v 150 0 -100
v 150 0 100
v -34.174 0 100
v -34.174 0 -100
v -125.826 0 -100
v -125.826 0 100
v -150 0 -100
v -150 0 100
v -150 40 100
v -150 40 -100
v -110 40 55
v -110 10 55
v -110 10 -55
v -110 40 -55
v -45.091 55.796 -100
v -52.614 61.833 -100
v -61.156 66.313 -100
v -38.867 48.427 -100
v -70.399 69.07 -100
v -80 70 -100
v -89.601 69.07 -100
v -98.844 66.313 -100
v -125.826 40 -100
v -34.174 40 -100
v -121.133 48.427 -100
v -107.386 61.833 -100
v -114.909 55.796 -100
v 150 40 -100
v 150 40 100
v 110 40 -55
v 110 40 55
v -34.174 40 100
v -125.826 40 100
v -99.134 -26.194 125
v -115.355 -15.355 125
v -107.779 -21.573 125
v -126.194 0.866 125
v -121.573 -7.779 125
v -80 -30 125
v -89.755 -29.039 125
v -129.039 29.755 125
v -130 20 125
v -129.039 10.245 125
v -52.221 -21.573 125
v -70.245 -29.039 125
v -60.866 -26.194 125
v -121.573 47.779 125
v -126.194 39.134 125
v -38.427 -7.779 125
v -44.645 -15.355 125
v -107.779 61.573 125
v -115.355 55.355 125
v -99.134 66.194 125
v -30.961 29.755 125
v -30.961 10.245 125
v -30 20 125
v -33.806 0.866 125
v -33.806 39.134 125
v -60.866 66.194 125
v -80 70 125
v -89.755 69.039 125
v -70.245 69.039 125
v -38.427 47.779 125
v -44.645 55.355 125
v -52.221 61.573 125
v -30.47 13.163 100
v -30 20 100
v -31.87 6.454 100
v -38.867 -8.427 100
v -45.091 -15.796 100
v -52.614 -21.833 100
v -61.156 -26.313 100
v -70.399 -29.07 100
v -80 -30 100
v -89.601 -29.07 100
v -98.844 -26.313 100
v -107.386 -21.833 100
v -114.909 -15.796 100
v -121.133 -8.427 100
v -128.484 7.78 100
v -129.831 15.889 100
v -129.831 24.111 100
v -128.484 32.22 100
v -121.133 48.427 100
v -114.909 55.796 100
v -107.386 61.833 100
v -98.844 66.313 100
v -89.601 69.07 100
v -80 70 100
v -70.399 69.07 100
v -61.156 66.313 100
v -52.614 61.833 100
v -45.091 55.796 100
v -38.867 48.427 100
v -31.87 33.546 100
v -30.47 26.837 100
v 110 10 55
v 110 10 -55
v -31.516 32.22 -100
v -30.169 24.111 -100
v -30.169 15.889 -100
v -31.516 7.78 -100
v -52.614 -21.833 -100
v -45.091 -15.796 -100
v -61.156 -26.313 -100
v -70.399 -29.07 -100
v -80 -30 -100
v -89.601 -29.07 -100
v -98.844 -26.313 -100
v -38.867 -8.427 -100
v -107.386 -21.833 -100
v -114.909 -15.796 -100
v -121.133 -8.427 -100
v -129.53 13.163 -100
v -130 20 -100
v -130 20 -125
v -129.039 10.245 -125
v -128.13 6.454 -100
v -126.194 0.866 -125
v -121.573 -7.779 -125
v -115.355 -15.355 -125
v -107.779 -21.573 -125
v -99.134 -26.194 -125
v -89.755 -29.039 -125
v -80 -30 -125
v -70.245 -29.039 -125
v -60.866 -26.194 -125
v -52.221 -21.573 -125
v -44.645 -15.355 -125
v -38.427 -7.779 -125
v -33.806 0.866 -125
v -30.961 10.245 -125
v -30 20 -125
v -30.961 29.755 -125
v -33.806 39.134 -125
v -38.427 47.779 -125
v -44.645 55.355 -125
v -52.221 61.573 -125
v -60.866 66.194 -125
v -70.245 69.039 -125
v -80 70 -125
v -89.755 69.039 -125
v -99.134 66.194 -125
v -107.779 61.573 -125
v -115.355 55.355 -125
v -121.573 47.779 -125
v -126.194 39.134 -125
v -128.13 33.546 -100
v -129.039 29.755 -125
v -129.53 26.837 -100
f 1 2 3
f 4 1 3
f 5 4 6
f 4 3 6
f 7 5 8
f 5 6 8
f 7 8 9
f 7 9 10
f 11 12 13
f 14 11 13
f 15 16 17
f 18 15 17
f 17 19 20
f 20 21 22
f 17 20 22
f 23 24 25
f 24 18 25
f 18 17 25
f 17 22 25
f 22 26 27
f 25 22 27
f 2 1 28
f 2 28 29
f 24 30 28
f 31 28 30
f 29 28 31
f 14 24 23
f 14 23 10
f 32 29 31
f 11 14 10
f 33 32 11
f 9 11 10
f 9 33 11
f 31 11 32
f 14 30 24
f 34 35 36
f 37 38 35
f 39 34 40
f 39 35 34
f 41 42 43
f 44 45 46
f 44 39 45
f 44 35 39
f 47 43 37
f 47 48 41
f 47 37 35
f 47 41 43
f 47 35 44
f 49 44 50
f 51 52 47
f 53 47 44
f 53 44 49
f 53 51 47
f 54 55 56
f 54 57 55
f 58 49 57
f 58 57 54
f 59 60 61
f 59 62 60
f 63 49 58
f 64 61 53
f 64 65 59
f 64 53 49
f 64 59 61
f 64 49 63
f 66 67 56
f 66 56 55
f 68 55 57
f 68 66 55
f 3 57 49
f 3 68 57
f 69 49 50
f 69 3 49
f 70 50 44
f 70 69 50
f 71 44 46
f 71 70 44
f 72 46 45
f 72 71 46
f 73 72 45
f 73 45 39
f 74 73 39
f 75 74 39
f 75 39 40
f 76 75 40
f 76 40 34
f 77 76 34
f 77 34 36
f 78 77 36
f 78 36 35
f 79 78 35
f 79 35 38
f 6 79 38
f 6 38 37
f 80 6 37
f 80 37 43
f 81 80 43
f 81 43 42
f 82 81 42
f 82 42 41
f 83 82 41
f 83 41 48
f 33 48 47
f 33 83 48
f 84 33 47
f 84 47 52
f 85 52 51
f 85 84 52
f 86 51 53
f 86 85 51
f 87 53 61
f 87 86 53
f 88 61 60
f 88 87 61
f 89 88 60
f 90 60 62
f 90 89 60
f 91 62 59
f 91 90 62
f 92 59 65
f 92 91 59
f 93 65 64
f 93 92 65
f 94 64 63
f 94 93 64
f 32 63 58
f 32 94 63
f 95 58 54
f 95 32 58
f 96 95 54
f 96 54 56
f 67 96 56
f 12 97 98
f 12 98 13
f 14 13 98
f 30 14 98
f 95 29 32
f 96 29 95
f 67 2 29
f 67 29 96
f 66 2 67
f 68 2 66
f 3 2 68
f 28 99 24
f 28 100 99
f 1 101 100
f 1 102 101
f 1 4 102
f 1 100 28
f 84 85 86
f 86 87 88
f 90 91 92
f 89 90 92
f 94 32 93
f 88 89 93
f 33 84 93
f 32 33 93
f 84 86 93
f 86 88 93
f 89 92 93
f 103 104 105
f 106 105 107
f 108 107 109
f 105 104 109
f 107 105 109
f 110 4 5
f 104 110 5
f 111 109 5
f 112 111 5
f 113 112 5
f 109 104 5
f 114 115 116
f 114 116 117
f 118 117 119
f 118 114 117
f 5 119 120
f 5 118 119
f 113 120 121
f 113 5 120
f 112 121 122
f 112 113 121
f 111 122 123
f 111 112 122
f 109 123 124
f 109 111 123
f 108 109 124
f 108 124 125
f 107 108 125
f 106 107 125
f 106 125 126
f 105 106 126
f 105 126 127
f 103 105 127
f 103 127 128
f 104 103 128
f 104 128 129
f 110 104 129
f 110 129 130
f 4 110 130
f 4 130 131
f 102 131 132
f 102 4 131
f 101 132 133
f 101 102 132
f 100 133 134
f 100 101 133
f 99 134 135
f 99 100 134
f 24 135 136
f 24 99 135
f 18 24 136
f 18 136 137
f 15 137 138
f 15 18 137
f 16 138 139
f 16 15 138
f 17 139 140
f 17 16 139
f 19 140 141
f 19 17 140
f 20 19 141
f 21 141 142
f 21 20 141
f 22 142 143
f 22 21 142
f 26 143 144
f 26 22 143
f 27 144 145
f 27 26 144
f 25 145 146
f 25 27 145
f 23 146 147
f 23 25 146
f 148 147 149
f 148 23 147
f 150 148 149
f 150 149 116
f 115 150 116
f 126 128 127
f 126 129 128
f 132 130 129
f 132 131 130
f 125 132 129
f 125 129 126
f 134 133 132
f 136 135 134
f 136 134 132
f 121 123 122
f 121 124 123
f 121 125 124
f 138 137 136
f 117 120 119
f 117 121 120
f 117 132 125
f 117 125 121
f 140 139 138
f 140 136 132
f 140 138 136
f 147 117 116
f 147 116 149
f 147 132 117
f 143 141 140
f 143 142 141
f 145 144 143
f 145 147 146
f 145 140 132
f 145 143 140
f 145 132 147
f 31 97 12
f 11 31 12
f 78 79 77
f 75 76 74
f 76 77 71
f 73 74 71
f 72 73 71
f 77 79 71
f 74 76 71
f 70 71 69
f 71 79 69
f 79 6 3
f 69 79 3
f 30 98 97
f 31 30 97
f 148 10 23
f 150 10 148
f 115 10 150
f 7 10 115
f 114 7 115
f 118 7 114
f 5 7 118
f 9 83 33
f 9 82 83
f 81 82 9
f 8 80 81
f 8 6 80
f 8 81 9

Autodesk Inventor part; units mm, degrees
ref_plane "YZ Plane" through (0, 0, 0) normal (1, 0, 0) x (0, 1, 0)
ref_plane "XZ Plane" through (0, 0, 0) normal (0, 1, 0) x (-1, 0, 0)
ref_plane "XY Plane" through (0, 0, 0) normal (0, 0, 1) x (1, 0, 0)
sketch "Sketch1" plane through (0, 0, 0) normal (0, 1, 0) x (-1, 0, 0)
  line L0 (-110, 55) -> (110, 55)
  line L1 (110, 55) -> (110, -55)
  line L2 (110, -55) -> (-110, -55)
  line L3 (-110, -55) -> (-110, 55)
  line L4 (-110, 55) -> (110, -55) construction
  line L5 (110, 55) -> (-110, -55) construction
  line L6 (-150, 100) -> (150, 100)
  line L7 (150, 100) -> (150, -100)
  line L8 (150, -100) -> (-150, -100)
  line L9 (-150, -100) -> (-150, 100)
  line L10 (-150, 100) -> (150, -100) construction
  line L11 (150, 100) -> (-150, -100) construction
  point P0 (0, 0)
  dimension "d0" = 220
  dimension "d1" = 110
  dimension "d2" = 300
  dimension "d3" = 200
extrude "Extrusion1" add sketch "Sketch1" along normal blind 10 contours L0 L1 L2 L3
extrude "Extrusion2" add sketch "Sketch1" along normal blind 40
sketch "Sketch2" plane through (-150, 0, 100) normal (0, 0, 1) x (1, 0, 0)
  line L0 (300, 0) -> (0, 0) projected
  line L1 (300, 0) -> (300, 40) projected
  line L2 (0, 0) -> (300, 0)
  line L3 (300, 0) -> (300, 40)
  line L4 (300, 40) -> (0, 40)
  line L5 (0, 40) -> (0, 0)
  circle A0 centre (70, 20) radius 50
  point P0 (150, 0)
  dimension "d8" = 100
sketch "Sketch3" plane through (150, 0, -100) normal (0, 0, -1) x (-1, 0, 0)
  line L0 (300, 0) -> (300, 40) projected
  line L1 (0, 40) -> (300, 40) projected
  line L2 (300, 0) -> (0, 0)
  line L3 (0, 0) -> (0, 40)
  line L4 (0, 40) -> (300, 40)
  line L5 (300, 40) -> (300, 0)
  line L6 (300, 0) -> (230, 0) construction
  line L7 (230, 0) -> (230, 20) construction
  line L8 (230, 20) -> (300, 20) construction
  line L9 (300, 20) -> (300, 0) construction
  circle A0 centre (230, 20) radius 50
  point P0 (150, 0)
  dimension "d9" = 70
  dimension "d10" = 20
  dimension "d11" = 100
extrude "Extrusion3" add sketch "Sketch3" along normal blind 25 contours A0 L2 | L2 A0 L1 | L1 A0
extrude "Extrusion4" add sketch "Sketch2" along normal blind 25 contours A0 L0 | L0 A0 L4 | L4 A0
properties part number "Chassis"
